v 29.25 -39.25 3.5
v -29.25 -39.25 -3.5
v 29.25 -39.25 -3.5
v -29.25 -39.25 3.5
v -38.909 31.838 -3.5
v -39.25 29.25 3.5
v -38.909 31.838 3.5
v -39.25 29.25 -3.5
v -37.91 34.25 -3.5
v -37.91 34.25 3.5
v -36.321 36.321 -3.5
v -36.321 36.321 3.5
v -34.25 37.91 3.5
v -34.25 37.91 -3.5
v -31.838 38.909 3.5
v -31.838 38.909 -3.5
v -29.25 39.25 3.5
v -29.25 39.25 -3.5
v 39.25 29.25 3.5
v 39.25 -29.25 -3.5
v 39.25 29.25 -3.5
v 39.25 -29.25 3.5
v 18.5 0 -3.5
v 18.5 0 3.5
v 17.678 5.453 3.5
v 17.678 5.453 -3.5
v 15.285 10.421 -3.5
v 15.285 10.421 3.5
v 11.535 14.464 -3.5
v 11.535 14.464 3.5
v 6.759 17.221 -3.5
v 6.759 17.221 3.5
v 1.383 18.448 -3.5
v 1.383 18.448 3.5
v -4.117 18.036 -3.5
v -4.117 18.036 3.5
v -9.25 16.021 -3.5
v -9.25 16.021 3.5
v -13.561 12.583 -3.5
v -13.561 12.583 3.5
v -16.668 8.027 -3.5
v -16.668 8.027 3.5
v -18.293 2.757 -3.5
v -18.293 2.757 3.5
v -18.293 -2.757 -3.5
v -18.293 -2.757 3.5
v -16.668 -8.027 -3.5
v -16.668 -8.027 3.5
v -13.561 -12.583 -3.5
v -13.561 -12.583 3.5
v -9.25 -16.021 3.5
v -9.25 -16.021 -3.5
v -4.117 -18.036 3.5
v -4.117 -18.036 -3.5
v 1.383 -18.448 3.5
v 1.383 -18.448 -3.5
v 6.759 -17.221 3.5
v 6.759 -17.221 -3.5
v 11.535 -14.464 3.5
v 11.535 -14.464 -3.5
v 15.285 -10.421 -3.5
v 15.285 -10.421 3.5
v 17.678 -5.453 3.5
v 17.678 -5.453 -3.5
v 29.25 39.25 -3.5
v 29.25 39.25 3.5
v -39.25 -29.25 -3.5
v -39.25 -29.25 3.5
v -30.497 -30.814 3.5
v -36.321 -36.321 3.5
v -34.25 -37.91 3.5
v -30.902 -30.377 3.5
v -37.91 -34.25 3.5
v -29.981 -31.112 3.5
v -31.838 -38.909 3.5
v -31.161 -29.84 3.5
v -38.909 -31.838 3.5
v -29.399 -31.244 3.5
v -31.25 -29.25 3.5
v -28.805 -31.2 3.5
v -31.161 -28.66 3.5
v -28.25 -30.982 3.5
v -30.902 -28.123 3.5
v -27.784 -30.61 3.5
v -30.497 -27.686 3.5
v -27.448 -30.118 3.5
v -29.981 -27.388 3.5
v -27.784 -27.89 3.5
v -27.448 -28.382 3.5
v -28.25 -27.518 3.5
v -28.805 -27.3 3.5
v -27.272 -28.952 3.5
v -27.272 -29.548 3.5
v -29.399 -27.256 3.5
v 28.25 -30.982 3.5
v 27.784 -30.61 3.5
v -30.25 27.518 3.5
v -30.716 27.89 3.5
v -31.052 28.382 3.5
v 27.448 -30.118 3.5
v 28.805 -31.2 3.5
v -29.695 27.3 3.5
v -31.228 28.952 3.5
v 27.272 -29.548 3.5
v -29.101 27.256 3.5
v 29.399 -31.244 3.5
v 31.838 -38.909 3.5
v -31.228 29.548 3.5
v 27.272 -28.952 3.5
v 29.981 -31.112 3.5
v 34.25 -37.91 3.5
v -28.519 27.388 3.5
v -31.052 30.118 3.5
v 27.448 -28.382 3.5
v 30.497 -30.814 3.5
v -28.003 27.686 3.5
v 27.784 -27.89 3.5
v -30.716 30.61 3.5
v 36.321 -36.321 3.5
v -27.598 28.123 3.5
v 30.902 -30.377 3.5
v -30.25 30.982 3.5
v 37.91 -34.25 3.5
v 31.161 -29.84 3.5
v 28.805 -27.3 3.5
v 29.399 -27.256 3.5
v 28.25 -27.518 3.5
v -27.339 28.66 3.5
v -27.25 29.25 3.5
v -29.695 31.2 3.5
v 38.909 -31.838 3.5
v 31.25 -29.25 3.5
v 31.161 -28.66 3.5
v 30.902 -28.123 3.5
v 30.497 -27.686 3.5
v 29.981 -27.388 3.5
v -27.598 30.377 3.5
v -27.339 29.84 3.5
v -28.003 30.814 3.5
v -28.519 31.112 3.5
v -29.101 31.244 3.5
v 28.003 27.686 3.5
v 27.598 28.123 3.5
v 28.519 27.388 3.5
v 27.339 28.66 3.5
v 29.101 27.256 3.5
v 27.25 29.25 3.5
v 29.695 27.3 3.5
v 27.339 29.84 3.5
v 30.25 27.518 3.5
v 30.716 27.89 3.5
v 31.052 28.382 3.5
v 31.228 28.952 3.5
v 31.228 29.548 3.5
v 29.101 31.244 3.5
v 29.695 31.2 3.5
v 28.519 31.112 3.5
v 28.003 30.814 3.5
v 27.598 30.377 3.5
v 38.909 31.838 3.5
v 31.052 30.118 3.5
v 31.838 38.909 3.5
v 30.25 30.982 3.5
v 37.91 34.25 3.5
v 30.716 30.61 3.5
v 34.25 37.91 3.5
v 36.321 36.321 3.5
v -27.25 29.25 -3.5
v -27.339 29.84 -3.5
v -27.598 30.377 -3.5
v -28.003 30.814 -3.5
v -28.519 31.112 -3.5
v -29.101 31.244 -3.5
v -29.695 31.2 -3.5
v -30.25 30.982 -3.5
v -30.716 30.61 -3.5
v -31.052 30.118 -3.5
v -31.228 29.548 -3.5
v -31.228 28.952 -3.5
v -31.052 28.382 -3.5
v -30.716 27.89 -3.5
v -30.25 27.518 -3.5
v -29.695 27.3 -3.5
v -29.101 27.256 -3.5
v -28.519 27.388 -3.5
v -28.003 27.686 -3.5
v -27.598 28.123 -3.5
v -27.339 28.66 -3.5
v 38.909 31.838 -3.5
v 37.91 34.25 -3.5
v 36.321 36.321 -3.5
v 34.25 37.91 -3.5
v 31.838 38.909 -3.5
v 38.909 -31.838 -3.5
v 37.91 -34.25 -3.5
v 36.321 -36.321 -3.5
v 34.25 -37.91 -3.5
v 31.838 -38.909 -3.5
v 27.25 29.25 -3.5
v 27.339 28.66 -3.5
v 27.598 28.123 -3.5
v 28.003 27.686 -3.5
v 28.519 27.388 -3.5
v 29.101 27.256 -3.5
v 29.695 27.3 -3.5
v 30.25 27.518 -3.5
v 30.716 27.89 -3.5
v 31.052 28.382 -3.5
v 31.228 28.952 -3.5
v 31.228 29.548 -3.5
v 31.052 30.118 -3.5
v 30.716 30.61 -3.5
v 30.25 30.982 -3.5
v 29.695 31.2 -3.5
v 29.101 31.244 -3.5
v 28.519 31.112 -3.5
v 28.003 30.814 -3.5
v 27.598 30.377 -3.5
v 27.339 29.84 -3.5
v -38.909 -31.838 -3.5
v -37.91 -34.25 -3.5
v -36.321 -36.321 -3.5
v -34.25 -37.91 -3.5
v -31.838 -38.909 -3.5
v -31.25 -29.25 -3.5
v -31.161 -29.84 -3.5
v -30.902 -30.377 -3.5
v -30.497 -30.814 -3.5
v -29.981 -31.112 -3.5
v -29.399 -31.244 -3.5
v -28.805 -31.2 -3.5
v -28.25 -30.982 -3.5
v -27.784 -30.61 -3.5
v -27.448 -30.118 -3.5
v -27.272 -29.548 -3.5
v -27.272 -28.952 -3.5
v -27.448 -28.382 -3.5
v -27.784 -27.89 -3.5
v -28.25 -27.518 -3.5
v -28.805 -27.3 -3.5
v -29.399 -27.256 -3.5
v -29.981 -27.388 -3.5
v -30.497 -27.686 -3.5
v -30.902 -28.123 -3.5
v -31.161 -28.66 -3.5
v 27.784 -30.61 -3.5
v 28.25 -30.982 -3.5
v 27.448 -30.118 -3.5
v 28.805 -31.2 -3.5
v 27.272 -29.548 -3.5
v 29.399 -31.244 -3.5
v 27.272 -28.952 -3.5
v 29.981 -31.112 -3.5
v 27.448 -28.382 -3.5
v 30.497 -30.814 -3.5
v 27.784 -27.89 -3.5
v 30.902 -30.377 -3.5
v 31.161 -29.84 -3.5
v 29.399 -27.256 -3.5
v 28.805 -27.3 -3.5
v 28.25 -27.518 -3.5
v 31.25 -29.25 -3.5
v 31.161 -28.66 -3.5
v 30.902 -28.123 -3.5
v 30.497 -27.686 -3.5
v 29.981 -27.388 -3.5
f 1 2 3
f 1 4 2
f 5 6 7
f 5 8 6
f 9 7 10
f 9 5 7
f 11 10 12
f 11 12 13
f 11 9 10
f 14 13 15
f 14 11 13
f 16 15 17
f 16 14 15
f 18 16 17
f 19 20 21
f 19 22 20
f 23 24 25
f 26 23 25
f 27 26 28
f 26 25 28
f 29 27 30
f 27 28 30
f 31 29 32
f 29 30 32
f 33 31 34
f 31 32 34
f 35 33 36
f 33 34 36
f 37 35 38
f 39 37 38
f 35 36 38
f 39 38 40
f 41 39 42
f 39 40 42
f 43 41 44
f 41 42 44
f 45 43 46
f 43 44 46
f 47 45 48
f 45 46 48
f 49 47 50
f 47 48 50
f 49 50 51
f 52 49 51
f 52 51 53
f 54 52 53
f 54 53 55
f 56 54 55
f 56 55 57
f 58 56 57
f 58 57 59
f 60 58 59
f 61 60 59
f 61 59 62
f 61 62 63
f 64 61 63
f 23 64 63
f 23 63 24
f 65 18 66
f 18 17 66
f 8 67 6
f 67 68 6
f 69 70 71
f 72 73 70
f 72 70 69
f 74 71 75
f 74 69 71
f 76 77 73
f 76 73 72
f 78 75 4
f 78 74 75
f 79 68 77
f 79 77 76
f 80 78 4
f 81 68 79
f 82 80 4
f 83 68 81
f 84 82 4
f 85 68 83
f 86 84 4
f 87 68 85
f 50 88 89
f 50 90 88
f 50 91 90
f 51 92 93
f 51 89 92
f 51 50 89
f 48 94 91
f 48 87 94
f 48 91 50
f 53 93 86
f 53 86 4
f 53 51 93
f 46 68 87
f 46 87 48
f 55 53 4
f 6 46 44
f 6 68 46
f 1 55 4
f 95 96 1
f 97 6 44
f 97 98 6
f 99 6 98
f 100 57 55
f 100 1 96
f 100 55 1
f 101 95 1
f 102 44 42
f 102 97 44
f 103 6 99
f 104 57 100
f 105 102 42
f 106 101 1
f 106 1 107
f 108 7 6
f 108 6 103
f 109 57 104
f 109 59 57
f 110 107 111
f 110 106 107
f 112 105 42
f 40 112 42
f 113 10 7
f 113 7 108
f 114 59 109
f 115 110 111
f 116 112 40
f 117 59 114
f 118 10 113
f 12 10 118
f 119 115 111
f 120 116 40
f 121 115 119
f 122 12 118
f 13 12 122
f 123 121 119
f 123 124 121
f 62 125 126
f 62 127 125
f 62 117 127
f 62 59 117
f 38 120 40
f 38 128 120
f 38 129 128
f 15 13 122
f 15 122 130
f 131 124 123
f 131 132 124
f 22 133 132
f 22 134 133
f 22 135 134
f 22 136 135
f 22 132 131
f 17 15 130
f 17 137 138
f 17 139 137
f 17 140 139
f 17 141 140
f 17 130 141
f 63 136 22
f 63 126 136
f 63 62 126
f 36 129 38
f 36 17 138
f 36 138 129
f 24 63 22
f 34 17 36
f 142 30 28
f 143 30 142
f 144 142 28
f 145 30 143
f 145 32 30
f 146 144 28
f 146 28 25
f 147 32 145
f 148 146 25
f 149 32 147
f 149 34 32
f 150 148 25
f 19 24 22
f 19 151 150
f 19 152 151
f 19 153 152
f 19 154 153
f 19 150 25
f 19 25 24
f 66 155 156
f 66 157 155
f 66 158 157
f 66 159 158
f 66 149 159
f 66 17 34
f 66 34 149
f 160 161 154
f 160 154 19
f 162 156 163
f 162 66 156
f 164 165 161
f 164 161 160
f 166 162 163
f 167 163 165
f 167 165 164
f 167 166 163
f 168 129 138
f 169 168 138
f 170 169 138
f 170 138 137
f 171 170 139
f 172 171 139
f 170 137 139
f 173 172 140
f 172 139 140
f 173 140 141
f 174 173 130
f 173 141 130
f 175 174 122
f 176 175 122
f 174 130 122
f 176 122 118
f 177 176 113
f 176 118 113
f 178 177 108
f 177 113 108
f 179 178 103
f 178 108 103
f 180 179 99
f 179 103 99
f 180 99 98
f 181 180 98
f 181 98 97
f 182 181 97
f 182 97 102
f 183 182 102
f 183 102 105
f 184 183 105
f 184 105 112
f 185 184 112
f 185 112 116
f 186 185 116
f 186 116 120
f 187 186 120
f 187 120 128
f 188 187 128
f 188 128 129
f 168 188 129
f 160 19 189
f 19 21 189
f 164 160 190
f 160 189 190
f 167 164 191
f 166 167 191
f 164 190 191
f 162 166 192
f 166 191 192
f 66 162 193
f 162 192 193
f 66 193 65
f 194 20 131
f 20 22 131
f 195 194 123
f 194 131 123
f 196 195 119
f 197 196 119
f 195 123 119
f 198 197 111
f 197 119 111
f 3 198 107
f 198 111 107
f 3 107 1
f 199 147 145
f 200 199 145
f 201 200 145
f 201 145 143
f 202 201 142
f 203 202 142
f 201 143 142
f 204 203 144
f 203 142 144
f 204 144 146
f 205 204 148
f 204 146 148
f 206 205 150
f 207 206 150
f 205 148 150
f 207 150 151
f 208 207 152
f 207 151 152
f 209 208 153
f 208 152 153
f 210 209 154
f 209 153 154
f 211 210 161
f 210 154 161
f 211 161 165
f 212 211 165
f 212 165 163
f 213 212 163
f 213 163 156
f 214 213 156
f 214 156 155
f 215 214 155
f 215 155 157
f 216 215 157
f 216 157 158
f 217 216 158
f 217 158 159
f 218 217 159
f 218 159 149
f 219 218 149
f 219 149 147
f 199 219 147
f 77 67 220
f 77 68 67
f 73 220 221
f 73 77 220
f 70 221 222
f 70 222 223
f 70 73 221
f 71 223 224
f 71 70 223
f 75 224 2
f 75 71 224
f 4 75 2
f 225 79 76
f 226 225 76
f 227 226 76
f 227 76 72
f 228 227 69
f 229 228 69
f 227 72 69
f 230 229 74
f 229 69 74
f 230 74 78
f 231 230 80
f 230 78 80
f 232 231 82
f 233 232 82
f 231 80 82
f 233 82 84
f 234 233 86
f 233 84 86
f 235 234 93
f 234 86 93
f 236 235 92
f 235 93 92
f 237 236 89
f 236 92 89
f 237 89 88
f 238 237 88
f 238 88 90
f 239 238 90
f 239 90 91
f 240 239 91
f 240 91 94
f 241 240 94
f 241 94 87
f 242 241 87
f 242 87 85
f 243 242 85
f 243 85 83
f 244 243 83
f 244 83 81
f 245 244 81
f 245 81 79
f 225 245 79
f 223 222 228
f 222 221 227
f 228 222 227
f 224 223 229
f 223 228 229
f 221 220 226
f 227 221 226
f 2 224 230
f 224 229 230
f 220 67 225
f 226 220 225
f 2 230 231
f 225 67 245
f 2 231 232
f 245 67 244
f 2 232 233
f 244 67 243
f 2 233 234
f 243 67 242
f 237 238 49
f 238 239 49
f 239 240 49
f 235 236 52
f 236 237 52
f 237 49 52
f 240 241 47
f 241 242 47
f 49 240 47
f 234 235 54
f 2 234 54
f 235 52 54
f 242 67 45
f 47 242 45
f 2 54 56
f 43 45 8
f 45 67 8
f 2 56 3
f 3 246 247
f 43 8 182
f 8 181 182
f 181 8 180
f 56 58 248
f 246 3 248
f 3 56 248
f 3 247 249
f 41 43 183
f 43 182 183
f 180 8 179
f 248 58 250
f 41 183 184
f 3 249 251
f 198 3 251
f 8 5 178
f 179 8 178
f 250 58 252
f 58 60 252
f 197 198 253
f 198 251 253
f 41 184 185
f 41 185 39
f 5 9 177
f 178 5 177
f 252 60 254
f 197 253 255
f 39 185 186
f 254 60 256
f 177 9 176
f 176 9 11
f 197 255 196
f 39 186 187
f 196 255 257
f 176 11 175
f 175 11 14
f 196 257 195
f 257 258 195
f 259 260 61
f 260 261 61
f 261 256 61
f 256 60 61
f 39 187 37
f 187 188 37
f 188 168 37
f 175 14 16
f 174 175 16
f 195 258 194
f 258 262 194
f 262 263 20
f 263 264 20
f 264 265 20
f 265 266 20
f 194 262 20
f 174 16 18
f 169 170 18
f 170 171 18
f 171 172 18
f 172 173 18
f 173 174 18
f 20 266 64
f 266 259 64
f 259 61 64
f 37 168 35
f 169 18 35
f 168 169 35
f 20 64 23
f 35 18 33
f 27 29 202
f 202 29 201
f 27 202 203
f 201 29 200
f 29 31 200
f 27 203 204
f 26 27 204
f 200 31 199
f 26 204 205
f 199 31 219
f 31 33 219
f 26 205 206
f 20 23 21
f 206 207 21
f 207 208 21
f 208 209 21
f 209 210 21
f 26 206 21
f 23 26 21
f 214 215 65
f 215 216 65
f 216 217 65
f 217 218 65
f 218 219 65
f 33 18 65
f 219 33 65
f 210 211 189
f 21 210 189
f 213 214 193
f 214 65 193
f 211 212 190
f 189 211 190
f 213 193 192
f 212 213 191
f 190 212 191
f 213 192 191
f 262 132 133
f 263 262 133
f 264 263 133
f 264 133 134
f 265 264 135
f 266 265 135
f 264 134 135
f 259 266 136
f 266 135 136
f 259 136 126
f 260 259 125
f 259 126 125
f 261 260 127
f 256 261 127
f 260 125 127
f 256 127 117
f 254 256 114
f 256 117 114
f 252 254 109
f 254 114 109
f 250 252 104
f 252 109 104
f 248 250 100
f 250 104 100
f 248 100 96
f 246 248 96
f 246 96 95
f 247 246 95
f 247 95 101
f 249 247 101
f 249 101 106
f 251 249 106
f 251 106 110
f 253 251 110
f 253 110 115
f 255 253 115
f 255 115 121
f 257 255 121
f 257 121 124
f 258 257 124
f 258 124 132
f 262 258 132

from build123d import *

# Parameters (mm, degrees)
SKETCH1_W           = 78.5
SKETCH1_H           = 78.5
BOSS_EXTRUDE1_DEPTH = 3.5
FILLET1_R           = 10
SKETCH2_R           = 2
CUT_EXTRUDE1_DEPTH  = 56.947520052
SKETCH3_R           = 18.5
CUT_EXTRUDE2_DEPTH  = 56.947520052


with BuildPart() as part:
    # Sketch1 → Boss-Extrude1 (new, symmetric)
    with BuildSketch(Plane.XY):
        Rectangle(SKETCH1_W, SKETCH1_H)
    extrude(amount=BOSS_EXTRUDE1_DEPTH, both=True)

    # Fillet1
    fillet1_edges = [part.edges().sort_by_distance(p)[0] for p in [
        (39.25, -39.25, 0),
        (-39.25, -39.25, 0),
        (-39.25, 39.25, 0),
        (39.25, 39.25, 0),
    ]]
    fillet(fillet1_edges, radius=FILLET1_R)

    # Sketch2 → Cut-Extrude1 (cut, through all)
    with BuildSketch(Plane.XY.offset(3.5)):
        with Locations((-29.25, 29.25)):
            Circle(SKETCH2_R)
        with Locations(Location((-29.25, -29.25, 0), (0, 0, 180))):
            Circle(SKETCH2_R)
        with Locations(Location((29.25, 29.25, 0), (0, 0, 180))):
            Circle(SKETCH2_R)
        with Locations((29.25, -29.25)):
            Circle(SKETCH2_R)
    extrude(amount=-CUT_EXTRUDE1_DEPTH, mode=Mode.SUBTRACT)

    # Sketch3 → Cut-Extrude2 (cut, through all)
    with BuildSketch(Plane.XY.offset(3.5)):
        Circle(SKETCH3_R)
    extrude(amount=-CUT_EXTRUDE2_DEPTH, mode=Mode.SUBTRACT)


solid = part.part
